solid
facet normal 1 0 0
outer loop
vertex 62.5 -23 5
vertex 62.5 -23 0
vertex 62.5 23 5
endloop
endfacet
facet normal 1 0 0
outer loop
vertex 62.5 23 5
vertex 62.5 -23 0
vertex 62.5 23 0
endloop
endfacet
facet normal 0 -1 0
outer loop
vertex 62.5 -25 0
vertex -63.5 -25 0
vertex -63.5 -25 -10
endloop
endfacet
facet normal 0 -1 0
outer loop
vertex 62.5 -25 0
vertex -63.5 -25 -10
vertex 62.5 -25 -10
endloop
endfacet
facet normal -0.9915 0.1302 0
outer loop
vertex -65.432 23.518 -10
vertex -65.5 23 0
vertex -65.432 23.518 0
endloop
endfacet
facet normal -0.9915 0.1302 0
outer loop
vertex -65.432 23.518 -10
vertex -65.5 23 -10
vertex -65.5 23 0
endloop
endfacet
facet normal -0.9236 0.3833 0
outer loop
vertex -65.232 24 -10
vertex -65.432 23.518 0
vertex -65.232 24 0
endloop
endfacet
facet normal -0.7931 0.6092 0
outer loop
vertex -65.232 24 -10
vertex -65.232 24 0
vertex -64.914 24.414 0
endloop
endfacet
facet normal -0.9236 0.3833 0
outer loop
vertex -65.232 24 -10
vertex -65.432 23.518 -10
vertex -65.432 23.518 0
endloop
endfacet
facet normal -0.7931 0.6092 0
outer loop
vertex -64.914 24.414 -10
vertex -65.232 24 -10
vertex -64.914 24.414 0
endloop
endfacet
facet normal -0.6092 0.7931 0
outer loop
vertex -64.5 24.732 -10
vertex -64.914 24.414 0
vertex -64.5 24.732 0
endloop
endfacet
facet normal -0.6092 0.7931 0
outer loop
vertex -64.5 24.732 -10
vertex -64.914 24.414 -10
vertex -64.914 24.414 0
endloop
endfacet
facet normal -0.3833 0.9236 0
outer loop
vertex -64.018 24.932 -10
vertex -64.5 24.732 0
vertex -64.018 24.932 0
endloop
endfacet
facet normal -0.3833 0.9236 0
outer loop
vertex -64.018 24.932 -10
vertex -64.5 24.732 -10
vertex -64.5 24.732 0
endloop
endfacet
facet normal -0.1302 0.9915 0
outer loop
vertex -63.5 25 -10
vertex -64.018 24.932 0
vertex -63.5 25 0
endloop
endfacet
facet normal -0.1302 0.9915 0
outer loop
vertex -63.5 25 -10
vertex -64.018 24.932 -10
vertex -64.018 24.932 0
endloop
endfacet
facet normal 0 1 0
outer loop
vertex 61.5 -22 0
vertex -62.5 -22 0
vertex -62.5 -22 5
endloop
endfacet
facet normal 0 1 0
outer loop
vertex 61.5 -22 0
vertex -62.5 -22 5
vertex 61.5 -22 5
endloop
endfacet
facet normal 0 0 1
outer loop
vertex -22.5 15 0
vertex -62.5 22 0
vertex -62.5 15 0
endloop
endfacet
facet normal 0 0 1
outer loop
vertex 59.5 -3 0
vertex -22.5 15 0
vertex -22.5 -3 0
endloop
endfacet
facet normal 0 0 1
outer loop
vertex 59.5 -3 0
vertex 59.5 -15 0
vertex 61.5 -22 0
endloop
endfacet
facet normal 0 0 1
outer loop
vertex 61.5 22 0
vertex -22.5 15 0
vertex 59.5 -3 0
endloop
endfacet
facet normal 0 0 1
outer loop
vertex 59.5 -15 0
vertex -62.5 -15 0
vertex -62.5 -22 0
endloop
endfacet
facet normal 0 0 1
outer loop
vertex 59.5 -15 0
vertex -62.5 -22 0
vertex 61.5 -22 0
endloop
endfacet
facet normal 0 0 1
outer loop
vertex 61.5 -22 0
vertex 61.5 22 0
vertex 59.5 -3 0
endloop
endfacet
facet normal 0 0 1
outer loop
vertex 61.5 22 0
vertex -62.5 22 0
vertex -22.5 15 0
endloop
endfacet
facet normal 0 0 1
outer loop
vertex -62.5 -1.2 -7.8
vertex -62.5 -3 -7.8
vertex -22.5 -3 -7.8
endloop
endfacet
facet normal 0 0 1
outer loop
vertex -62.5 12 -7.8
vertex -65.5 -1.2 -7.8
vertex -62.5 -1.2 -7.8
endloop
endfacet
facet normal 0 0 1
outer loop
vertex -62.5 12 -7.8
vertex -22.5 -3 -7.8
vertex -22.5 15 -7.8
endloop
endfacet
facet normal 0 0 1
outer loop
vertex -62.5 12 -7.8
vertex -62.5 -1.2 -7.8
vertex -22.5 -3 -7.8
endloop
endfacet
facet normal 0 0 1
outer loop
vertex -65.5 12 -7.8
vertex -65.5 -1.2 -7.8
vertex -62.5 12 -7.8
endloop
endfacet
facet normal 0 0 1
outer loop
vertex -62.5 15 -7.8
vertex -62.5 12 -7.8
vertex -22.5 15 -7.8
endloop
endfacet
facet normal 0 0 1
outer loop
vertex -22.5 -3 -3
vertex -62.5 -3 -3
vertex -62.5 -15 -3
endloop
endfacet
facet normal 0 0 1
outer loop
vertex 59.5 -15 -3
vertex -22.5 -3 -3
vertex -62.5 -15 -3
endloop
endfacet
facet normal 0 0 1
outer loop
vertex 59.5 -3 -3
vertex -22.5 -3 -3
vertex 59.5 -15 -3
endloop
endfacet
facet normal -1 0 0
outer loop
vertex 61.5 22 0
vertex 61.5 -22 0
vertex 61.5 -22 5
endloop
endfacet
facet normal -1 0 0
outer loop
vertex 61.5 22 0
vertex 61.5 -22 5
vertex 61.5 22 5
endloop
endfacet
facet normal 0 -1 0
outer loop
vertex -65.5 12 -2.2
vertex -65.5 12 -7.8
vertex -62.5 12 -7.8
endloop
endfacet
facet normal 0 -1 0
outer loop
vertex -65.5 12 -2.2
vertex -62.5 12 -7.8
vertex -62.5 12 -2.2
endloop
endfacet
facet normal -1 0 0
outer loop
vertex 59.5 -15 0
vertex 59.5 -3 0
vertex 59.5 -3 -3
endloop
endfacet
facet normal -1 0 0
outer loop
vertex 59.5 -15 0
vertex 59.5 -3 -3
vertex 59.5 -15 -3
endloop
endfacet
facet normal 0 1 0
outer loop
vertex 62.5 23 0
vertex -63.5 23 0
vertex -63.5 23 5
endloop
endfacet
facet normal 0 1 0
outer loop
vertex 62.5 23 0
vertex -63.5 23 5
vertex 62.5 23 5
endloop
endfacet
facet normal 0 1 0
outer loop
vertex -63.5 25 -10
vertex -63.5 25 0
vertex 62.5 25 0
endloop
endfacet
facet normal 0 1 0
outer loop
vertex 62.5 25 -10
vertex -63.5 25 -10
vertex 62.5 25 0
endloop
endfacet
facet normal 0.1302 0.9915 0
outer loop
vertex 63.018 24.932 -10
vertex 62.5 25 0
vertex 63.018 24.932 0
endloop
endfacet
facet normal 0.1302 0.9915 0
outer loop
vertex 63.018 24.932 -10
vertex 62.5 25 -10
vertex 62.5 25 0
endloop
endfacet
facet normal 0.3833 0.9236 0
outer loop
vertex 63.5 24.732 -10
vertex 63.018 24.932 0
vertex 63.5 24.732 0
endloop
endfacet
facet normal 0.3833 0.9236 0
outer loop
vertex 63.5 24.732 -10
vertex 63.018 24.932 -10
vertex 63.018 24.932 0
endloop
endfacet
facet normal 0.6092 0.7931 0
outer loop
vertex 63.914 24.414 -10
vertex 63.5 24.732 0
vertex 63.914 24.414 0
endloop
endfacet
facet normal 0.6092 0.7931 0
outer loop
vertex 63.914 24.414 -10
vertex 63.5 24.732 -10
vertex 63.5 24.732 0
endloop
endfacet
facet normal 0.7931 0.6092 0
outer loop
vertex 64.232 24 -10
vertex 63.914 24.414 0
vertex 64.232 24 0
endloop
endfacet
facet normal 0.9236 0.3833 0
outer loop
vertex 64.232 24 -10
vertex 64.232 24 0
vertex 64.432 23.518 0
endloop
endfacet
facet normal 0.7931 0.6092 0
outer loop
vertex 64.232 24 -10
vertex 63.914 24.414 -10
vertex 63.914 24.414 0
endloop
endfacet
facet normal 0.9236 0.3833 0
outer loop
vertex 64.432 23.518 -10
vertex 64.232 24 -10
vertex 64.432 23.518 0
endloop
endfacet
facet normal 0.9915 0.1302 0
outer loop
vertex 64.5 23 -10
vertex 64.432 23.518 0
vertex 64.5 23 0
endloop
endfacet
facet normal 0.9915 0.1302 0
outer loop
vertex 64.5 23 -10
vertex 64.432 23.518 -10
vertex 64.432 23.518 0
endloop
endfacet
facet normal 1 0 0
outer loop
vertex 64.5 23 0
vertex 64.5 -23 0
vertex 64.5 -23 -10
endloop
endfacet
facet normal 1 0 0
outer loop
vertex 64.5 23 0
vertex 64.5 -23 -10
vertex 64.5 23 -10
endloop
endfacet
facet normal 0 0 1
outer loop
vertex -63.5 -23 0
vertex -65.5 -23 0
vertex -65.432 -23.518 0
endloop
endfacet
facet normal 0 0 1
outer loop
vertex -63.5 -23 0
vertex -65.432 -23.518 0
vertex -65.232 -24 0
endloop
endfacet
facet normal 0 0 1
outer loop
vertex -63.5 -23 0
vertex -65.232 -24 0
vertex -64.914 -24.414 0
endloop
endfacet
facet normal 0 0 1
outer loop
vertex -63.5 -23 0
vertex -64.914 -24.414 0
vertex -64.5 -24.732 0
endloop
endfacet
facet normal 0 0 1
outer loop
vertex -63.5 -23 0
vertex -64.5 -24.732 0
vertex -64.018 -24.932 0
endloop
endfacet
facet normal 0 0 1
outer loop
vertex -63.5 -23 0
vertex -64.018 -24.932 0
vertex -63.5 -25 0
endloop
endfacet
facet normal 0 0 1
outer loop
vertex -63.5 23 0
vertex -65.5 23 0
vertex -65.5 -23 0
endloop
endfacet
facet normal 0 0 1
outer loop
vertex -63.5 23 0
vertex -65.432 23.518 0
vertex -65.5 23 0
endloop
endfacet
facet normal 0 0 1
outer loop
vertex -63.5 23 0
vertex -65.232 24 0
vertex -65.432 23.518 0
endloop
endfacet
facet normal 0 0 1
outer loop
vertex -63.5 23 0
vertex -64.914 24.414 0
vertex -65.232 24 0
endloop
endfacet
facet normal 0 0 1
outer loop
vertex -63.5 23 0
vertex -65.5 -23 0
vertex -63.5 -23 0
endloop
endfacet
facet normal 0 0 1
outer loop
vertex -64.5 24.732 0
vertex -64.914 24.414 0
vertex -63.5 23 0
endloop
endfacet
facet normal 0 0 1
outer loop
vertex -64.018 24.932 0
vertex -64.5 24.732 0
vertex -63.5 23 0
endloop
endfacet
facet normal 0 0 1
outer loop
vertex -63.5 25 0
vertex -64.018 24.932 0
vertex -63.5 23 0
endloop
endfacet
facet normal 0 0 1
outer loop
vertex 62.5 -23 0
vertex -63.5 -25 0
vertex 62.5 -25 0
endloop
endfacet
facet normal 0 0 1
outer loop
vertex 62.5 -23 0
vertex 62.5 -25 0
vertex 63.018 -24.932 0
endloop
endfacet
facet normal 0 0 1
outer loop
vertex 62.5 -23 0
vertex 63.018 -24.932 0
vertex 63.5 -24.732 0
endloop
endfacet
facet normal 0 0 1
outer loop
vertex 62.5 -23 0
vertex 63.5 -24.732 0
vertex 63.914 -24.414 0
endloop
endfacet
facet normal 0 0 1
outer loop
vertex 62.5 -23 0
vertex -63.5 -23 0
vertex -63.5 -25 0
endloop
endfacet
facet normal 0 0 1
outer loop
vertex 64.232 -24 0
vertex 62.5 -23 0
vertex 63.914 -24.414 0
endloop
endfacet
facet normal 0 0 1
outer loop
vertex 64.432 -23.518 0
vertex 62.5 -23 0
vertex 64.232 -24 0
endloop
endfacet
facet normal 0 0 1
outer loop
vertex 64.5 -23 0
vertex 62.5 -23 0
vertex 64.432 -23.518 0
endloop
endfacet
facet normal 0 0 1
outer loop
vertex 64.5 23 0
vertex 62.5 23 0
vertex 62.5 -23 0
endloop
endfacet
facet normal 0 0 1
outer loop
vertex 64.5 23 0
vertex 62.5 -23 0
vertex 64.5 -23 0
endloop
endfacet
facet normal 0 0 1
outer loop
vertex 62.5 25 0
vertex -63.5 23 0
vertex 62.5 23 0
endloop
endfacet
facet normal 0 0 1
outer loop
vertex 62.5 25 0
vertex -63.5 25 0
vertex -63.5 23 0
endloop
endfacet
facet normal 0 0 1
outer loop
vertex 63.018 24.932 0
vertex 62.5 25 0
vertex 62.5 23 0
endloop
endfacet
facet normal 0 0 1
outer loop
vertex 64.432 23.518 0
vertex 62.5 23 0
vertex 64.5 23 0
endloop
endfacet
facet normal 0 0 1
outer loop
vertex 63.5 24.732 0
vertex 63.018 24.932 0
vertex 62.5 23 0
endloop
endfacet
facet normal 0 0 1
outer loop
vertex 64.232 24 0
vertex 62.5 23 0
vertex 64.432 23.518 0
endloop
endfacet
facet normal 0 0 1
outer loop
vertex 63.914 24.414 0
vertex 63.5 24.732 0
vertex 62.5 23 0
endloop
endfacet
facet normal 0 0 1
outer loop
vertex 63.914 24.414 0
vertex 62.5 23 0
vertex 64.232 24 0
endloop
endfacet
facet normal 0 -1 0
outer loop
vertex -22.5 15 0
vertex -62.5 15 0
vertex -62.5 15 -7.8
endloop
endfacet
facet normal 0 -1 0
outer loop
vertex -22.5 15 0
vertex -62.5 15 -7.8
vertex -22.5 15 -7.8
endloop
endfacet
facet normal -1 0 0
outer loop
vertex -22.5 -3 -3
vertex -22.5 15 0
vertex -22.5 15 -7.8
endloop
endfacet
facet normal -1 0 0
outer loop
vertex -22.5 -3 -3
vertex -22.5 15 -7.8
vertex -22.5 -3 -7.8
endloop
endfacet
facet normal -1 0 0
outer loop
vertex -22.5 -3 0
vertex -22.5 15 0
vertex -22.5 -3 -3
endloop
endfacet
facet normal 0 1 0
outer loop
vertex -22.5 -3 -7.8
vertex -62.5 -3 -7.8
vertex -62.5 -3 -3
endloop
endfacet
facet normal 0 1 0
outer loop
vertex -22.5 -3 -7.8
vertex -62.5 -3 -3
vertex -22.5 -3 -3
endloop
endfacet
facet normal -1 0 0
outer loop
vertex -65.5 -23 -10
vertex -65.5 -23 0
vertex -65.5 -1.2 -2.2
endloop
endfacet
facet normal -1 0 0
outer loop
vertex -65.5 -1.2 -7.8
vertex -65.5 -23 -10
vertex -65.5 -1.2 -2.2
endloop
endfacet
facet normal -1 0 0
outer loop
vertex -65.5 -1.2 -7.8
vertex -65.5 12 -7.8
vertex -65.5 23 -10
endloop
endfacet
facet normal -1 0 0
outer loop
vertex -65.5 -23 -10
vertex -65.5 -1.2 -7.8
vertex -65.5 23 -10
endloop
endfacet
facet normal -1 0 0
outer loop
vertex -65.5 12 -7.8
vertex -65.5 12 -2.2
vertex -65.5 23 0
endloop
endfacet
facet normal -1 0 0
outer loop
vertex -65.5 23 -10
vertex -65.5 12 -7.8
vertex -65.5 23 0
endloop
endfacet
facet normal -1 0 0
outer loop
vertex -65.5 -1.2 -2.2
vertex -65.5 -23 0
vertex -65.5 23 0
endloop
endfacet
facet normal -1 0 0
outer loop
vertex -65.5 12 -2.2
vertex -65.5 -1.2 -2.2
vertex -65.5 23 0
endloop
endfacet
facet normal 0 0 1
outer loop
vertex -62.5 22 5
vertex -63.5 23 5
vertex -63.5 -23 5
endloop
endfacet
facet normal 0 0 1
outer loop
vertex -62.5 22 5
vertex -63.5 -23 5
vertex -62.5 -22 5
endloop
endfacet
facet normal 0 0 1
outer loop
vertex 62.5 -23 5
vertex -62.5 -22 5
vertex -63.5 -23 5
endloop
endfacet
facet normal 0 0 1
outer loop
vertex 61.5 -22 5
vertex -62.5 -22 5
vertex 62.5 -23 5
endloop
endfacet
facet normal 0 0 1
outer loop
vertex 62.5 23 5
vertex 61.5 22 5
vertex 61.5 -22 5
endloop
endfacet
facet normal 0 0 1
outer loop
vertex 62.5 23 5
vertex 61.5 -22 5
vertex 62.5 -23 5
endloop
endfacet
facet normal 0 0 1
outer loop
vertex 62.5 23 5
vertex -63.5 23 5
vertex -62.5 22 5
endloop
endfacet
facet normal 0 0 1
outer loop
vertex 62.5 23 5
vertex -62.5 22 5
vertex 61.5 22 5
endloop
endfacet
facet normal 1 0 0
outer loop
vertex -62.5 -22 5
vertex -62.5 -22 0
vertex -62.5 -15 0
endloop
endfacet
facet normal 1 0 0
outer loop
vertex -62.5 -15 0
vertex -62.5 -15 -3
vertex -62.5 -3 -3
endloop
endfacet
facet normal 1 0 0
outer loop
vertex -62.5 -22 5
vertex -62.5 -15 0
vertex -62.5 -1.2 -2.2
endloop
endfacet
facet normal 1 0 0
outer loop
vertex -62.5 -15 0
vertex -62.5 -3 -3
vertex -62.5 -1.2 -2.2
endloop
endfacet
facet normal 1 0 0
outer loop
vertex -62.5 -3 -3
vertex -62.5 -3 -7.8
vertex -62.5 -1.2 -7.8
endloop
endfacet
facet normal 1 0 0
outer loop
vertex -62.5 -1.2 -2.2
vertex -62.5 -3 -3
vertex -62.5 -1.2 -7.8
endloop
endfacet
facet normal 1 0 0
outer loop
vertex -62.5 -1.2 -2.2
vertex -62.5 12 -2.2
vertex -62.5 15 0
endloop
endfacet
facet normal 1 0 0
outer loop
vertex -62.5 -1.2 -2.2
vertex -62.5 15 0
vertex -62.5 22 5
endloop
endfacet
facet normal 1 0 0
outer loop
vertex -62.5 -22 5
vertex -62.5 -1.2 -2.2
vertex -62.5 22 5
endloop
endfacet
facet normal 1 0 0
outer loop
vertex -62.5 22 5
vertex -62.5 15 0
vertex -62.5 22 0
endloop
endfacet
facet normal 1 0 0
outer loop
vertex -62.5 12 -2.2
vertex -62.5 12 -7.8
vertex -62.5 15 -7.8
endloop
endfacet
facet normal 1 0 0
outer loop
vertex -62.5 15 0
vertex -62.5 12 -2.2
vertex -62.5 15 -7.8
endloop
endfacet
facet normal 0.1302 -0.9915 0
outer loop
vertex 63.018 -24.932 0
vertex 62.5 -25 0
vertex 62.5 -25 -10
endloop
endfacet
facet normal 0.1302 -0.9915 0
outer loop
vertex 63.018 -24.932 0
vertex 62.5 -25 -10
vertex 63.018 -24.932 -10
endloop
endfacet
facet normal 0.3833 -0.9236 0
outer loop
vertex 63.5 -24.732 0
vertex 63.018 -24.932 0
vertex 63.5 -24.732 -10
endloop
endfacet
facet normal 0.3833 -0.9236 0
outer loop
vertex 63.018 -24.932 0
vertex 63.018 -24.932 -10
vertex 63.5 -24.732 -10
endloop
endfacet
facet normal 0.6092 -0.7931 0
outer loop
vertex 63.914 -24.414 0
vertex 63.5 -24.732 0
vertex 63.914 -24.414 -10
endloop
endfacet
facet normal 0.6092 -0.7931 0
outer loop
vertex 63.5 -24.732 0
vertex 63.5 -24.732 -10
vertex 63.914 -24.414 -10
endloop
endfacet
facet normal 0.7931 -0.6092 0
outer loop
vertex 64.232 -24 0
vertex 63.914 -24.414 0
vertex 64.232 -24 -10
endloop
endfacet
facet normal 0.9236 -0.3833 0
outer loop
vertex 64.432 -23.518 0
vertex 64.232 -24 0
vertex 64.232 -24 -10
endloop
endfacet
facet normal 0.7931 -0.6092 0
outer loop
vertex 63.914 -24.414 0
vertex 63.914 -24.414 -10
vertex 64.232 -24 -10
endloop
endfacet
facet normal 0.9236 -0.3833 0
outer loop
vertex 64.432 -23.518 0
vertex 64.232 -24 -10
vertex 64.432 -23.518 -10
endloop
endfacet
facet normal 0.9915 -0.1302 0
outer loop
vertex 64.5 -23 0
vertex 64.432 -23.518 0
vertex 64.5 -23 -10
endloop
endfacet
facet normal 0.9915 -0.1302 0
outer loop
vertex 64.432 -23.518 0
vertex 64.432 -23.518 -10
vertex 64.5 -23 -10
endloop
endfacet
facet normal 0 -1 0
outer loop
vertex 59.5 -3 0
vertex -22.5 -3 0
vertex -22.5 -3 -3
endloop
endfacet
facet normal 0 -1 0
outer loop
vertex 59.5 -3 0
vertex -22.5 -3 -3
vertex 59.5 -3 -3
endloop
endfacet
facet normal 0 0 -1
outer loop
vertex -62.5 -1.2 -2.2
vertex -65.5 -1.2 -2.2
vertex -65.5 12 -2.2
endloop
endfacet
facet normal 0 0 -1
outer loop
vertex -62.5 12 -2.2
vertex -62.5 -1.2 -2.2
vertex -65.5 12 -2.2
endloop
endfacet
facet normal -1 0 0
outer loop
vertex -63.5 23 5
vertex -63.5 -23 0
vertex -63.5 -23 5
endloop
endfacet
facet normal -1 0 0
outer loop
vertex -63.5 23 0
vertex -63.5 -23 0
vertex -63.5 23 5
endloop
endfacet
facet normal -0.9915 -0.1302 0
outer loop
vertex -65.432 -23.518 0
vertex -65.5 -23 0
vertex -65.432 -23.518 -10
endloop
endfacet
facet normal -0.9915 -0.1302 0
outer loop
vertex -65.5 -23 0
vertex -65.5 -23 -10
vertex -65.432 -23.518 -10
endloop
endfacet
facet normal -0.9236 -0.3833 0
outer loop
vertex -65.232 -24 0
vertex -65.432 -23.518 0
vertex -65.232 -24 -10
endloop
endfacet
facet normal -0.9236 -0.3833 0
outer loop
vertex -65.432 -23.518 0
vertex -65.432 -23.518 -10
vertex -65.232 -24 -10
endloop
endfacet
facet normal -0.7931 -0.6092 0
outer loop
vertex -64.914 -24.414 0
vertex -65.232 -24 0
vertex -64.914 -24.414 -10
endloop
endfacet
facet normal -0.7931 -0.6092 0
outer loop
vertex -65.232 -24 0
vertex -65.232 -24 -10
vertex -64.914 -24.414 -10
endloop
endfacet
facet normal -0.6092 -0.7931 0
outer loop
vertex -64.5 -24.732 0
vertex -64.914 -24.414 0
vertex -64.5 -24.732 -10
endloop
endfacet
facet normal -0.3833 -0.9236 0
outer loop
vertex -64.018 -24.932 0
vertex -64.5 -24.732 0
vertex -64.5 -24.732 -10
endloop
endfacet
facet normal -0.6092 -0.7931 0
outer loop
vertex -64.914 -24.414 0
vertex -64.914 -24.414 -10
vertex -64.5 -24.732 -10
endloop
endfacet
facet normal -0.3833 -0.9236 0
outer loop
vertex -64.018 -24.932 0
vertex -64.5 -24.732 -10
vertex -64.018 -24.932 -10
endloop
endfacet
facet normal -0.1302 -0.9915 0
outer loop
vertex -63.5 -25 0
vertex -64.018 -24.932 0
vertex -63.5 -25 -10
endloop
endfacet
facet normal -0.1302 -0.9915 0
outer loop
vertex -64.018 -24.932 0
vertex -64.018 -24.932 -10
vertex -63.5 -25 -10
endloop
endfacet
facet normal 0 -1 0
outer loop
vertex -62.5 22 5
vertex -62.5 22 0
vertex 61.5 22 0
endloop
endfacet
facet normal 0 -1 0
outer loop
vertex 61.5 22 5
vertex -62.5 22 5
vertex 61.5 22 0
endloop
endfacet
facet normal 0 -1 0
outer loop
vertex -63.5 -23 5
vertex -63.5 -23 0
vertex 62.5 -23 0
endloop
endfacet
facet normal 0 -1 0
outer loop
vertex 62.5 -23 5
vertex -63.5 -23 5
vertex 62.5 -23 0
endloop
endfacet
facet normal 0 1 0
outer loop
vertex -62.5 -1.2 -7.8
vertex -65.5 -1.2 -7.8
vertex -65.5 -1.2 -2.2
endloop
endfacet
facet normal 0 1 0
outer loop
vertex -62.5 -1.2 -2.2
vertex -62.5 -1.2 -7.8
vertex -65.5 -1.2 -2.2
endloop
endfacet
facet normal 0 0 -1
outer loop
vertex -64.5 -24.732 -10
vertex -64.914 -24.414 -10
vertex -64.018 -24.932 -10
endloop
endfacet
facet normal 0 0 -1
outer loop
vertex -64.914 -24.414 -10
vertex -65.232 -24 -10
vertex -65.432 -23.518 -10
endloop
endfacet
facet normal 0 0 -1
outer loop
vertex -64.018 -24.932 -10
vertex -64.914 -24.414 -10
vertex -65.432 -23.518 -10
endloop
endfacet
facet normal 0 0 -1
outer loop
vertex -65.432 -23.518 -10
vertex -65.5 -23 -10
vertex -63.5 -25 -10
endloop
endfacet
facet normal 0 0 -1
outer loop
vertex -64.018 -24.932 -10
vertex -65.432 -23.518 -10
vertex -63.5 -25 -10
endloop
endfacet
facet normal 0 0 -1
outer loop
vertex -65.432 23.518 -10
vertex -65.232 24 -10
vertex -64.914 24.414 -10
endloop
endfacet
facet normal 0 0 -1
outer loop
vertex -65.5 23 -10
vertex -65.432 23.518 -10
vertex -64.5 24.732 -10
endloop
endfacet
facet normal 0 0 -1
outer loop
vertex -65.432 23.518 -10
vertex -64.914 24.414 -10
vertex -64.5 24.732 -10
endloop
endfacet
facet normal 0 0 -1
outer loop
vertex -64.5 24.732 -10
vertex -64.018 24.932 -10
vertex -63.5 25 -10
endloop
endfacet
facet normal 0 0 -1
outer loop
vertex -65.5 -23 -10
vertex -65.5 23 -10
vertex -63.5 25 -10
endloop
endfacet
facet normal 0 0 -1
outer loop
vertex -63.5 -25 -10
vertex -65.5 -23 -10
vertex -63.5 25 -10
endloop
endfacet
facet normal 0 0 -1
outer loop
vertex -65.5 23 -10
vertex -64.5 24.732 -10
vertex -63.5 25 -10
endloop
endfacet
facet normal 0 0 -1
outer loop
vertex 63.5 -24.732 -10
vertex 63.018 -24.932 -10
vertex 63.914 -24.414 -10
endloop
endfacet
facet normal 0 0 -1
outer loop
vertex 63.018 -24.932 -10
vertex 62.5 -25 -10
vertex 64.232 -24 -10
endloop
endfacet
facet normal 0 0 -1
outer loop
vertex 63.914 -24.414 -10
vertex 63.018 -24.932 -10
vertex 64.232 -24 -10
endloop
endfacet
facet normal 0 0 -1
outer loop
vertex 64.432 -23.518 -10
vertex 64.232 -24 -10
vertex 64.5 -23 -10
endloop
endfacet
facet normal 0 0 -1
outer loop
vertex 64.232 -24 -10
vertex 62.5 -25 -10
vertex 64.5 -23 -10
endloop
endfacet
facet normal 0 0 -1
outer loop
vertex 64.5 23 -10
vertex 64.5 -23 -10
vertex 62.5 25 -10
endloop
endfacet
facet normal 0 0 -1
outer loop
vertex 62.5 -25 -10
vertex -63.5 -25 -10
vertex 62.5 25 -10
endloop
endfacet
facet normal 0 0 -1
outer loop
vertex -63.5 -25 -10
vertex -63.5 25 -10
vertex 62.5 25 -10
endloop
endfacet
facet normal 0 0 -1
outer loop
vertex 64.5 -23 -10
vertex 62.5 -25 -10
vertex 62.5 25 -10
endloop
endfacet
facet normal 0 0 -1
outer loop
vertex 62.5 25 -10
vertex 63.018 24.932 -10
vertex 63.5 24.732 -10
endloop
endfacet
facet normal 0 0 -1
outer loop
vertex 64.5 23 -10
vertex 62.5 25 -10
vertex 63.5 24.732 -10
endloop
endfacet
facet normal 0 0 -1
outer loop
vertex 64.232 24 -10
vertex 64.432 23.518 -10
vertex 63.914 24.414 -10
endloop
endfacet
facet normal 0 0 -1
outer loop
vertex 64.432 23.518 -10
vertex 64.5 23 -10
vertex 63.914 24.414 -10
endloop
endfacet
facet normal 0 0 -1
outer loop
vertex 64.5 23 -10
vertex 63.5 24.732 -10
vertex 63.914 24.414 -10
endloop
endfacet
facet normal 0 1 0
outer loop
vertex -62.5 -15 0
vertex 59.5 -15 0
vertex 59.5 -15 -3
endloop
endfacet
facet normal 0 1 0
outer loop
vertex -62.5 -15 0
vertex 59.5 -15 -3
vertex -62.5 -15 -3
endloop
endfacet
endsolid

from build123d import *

# Parameters (mm, degrees)
SKICA2_W                  = 130
SKICA2_H                  = 50
P_IDAT_VYSUNUT_M1_DEPTH   = 10
P_IDAT_START              = -10
SKICA2_7_W                = 122
SKICA2_7_H                = 12
P_IDAT_VYSUNUT_M3_DEPTH   = 7
SKICA2_8_W                = 40
SKICA2_8_H                = 18
P_IDAT_VYSUNUT_M4_DEPTH   = 2.2
SKICA3_W                  = 5.6
SKICA3_H                  = 13.2
ODEBRAT_VYSUNUT_M12_DEPTH = 11
SKICA4_W                  = 126
SKICA4_H                  = 46
SKICA4_W_2                = 124
SKICA4_H_2                = 44
P_IDAT_VYSUNUT_M5_DEPTH   = 5
ZAOBLIT1_R                = 2


with BuildPart() as part:
    # Skica2 → Přidat vysunutím1 (new body)
    with BuildSketch(Plane.XY):
        with Locations((-0.5, 0)):
            Rectangle(SKICA2_W, SKICA2_H)
        Polygon((-62.5, -15), (-62.5, -3), (-62.5, 15), (-22.5, 15), (-22.5, -3), (59.5, -3), (59.5, -15), align=None, mode=Mode.SUBTRACT)
    extrude(amount=-P_IDAT_VYSUNUT_M1_DEPTH)

    # Skica2<7> → Přidat vysunutím3 (add)
    with BuildSketch(Plane.XY.offset(P_IDAT_START)):
        with Locations((-1.5, -9)):
            Rectangle(SKICA2_7_W, SKICA2_7_H)
    extrude(amount=P_IDAT_VYSUNUT_M3_DEPTH)

    # Skica2<8> → Přidat vysunutím4 (add)
    with BuildSketch(Plane.XY.offset(P_IDAT_START)):
        with Locations((-42.5, 6)):
            Rectangle(SKICA2_8_W, SKICA2_8_H)
    extrude(amount=P_IDAT_VYSUNUT_M4_DEPTH)

    # Skica3 → Odebrat vysunutím12 (cut)
    with BuildSketch(Plane.ZY.offset(65.5)):
        with Locations((-5, 5.4)):
            Rectangle(SKICA3_W, SKICA3_H)
    extrude(amount=-ODEBRAT_VYSUNUT_M12_DEPTH, mode=Mode.SUBTRACT)

    # Skica4 → Přidat vysunutím5 (add)
    with BuildSketch(Plane.XY):
        with Locations((-0.5, 0)):
            Rectangle(SKICA4_W, SKICA4_H)
        with Locations((-0.5, 0)):
            Rectangle(SKICA4_W_2, SKICA4_H_2, mode=Mode.SUBTRACT)
    extrude(amount=P_IDAT_VYSUNUT_M5_DEPTH)

    # Zaoblit1
    zaoblit1_edges = [part.edges().sort_by_distance(p)[0] for p in [
        (-65.5, -25, -5),
        (-65.5, 25, -5),
        (64.5, 25, -5),
        (64.5, -25, -5),
    ]]
    fillet(zaoblit1_edges, radius=ZAOBLIT1_R)


solid = part.part
